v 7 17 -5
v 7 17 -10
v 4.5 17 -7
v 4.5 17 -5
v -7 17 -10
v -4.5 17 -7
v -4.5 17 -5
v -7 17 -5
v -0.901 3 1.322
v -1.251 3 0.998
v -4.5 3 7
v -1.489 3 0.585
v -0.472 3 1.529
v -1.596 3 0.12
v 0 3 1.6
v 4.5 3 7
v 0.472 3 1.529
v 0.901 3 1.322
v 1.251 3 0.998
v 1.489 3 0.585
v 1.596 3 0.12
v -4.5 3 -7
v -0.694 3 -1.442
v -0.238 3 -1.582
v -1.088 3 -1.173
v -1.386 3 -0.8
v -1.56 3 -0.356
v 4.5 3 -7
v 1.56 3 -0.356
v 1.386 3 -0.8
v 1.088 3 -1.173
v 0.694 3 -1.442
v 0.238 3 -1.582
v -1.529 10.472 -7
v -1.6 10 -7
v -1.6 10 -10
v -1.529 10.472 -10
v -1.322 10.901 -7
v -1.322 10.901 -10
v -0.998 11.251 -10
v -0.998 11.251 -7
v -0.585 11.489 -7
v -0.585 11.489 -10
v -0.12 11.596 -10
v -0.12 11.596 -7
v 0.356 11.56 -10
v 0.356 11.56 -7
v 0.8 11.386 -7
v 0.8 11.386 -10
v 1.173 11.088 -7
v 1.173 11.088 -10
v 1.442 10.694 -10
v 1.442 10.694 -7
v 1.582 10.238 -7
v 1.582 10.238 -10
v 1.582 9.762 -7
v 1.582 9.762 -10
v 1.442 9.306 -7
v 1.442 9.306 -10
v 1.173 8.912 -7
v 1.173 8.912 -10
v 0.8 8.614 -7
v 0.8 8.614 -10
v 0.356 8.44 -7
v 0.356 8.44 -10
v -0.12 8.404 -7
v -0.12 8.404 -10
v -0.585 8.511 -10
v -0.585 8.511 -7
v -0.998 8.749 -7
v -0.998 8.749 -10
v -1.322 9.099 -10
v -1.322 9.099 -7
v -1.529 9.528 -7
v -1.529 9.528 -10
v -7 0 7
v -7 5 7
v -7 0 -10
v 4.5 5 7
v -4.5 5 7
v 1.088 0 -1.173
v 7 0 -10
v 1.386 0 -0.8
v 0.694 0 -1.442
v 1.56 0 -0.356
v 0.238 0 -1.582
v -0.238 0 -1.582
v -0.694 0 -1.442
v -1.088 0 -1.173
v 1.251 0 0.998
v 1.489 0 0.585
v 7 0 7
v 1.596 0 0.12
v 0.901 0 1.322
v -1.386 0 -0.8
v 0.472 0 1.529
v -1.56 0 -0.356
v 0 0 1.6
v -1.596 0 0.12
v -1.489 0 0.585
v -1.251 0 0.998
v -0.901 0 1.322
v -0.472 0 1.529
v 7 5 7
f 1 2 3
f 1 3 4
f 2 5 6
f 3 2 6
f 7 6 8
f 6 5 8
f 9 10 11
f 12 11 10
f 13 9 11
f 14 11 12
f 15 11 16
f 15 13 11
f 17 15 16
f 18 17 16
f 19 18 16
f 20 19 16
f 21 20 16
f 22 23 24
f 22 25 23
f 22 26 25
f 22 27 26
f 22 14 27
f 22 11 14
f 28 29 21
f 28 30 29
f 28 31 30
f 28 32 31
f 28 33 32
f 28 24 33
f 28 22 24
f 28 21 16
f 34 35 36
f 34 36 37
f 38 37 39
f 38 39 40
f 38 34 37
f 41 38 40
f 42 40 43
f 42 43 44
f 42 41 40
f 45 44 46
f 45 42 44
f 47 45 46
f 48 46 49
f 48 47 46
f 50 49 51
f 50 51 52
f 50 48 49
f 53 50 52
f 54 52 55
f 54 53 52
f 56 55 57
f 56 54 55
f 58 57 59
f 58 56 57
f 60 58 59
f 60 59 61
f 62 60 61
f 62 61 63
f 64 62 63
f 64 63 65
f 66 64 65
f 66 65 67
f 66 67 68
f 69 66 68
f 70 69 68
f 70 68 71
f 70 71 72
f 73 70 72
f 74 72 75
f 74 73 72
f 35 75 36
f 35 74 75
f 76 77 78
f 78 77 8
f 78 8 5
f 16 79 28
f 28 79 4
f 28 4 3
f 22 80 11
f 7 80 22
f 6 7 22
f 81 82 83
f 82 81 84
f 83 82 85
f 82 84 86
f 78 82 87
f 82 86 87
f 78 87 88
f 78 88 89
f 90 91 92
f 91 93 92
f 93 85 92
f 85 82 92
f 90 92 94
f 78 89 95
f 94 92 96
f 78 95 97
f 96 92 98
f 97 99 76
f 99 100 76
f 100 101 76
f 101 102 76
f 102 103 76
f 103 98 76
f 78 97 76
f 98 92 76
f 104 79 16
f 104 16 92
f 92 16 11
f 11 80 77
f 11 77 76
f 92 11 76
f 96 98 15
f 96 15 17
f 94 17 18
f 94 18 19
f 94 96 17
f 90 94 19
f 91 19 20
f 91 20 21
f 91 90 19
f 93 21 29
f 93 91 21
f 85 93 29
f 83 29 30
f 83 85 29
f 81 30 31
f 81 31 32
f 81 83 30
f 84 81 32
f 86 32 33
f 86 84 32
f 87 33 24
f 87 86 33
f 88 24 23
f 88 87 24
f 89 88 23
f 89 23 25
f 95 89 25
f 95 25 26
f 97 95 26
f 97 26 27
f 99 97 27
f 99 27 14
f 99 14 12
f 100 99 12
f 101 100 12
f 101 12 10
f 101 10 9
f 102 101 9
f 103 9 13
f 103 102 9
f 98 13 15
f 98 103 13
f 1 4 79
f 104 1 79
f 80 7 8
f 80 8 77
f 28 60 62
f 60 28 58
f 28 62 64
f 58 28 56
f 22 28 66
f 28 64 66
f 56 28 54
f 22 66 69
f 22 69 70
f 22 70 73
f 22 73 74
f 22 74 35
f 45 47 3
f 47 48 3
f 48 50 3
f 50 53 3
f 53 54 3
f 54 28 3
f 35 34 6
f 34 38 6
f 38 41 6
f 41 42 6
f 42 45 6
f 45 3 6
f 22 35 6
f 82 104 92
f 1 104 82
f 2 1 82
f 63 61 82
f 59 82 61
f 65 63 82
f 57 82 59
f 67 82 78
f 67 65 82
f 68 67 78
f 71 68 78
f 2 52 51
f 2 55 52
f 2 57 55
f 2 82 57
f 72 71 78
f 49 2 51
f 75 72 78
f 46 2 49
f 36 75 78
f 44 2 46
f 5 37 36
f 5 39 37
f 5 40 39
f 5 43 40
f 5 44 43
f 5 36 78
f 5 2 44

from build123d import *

# Parameters (mm, degrees)
SKETCH1_W           = 14
SKETCH1_H           = 14
SKETCH1_R           = 1.6
BOSS_EXTRUDE1_DEPTH = 3
SKETCH2_R           = 1.6
BOSS_EXTRUDE2_DEPTH = 3
BOSS_EXTRUDE3_START = -4.5
BOSS_EXTRUDE3_DEPTH = 2.5


with BuildPart() as part:
    # Sketch1 → Boss-Extrude1 (new body)
    with BuildSketch(Plane(origin=(0, 0, 0), x_dir=(1, 0, 0), z_dir=(0, 1, 0))):
        Rectangle(SKETCH1_W, SKETCH1_H)
        with Locations(Location((0, 0, 0), (0, 0, 270))):
            Circle(SKETCH1_R, mode=Mode.SUBTRACT)
    extrude(amount=BOSS_EXTRUDE1_DEPTH)

    # Sketch2 → Boss-Extrude2 (add)
    with BuildSketch(Plane(origin=(0, 0, -7), x_dir=(-1, 0, 0), z_dir=(0, 0, -1))):
        Polygon((-7, 3), (-7, 0), (7, 0), (7, 3), (7, 17), (-7, 17), align=None)
        with Locations((0, 10)):
            Circle(SKETCH2_R, mode=Mode.SUBTRACT)
    extrude(amount=BOSS_EXTRUDE2_DEPTH)

    # Sketch5 → Boss-Extrude3 (add)
    with BuildSketch(Plane(origin=(0, 0, 0), x_dir=(0, 0, -1), z_dir=(1, 0, 0)).offset(BOSS_EXTRUDE3_START)):
        Polygon((7, 17), (5, 17), (-7, 5), (-7, 3), (7, 3), align=None)
    boss_extrude3 = extrude(amount=-BOSS_EXTRUDE3_DEPTH)

    # Mirror2: Boss-Extrude3 across plane
    add(boss_extrude3.mirror(Plane(origin=(0, 0, 0), x_dir=(0, 0, 1), z_dir=(1, 0, 0))))


solid = part.part
